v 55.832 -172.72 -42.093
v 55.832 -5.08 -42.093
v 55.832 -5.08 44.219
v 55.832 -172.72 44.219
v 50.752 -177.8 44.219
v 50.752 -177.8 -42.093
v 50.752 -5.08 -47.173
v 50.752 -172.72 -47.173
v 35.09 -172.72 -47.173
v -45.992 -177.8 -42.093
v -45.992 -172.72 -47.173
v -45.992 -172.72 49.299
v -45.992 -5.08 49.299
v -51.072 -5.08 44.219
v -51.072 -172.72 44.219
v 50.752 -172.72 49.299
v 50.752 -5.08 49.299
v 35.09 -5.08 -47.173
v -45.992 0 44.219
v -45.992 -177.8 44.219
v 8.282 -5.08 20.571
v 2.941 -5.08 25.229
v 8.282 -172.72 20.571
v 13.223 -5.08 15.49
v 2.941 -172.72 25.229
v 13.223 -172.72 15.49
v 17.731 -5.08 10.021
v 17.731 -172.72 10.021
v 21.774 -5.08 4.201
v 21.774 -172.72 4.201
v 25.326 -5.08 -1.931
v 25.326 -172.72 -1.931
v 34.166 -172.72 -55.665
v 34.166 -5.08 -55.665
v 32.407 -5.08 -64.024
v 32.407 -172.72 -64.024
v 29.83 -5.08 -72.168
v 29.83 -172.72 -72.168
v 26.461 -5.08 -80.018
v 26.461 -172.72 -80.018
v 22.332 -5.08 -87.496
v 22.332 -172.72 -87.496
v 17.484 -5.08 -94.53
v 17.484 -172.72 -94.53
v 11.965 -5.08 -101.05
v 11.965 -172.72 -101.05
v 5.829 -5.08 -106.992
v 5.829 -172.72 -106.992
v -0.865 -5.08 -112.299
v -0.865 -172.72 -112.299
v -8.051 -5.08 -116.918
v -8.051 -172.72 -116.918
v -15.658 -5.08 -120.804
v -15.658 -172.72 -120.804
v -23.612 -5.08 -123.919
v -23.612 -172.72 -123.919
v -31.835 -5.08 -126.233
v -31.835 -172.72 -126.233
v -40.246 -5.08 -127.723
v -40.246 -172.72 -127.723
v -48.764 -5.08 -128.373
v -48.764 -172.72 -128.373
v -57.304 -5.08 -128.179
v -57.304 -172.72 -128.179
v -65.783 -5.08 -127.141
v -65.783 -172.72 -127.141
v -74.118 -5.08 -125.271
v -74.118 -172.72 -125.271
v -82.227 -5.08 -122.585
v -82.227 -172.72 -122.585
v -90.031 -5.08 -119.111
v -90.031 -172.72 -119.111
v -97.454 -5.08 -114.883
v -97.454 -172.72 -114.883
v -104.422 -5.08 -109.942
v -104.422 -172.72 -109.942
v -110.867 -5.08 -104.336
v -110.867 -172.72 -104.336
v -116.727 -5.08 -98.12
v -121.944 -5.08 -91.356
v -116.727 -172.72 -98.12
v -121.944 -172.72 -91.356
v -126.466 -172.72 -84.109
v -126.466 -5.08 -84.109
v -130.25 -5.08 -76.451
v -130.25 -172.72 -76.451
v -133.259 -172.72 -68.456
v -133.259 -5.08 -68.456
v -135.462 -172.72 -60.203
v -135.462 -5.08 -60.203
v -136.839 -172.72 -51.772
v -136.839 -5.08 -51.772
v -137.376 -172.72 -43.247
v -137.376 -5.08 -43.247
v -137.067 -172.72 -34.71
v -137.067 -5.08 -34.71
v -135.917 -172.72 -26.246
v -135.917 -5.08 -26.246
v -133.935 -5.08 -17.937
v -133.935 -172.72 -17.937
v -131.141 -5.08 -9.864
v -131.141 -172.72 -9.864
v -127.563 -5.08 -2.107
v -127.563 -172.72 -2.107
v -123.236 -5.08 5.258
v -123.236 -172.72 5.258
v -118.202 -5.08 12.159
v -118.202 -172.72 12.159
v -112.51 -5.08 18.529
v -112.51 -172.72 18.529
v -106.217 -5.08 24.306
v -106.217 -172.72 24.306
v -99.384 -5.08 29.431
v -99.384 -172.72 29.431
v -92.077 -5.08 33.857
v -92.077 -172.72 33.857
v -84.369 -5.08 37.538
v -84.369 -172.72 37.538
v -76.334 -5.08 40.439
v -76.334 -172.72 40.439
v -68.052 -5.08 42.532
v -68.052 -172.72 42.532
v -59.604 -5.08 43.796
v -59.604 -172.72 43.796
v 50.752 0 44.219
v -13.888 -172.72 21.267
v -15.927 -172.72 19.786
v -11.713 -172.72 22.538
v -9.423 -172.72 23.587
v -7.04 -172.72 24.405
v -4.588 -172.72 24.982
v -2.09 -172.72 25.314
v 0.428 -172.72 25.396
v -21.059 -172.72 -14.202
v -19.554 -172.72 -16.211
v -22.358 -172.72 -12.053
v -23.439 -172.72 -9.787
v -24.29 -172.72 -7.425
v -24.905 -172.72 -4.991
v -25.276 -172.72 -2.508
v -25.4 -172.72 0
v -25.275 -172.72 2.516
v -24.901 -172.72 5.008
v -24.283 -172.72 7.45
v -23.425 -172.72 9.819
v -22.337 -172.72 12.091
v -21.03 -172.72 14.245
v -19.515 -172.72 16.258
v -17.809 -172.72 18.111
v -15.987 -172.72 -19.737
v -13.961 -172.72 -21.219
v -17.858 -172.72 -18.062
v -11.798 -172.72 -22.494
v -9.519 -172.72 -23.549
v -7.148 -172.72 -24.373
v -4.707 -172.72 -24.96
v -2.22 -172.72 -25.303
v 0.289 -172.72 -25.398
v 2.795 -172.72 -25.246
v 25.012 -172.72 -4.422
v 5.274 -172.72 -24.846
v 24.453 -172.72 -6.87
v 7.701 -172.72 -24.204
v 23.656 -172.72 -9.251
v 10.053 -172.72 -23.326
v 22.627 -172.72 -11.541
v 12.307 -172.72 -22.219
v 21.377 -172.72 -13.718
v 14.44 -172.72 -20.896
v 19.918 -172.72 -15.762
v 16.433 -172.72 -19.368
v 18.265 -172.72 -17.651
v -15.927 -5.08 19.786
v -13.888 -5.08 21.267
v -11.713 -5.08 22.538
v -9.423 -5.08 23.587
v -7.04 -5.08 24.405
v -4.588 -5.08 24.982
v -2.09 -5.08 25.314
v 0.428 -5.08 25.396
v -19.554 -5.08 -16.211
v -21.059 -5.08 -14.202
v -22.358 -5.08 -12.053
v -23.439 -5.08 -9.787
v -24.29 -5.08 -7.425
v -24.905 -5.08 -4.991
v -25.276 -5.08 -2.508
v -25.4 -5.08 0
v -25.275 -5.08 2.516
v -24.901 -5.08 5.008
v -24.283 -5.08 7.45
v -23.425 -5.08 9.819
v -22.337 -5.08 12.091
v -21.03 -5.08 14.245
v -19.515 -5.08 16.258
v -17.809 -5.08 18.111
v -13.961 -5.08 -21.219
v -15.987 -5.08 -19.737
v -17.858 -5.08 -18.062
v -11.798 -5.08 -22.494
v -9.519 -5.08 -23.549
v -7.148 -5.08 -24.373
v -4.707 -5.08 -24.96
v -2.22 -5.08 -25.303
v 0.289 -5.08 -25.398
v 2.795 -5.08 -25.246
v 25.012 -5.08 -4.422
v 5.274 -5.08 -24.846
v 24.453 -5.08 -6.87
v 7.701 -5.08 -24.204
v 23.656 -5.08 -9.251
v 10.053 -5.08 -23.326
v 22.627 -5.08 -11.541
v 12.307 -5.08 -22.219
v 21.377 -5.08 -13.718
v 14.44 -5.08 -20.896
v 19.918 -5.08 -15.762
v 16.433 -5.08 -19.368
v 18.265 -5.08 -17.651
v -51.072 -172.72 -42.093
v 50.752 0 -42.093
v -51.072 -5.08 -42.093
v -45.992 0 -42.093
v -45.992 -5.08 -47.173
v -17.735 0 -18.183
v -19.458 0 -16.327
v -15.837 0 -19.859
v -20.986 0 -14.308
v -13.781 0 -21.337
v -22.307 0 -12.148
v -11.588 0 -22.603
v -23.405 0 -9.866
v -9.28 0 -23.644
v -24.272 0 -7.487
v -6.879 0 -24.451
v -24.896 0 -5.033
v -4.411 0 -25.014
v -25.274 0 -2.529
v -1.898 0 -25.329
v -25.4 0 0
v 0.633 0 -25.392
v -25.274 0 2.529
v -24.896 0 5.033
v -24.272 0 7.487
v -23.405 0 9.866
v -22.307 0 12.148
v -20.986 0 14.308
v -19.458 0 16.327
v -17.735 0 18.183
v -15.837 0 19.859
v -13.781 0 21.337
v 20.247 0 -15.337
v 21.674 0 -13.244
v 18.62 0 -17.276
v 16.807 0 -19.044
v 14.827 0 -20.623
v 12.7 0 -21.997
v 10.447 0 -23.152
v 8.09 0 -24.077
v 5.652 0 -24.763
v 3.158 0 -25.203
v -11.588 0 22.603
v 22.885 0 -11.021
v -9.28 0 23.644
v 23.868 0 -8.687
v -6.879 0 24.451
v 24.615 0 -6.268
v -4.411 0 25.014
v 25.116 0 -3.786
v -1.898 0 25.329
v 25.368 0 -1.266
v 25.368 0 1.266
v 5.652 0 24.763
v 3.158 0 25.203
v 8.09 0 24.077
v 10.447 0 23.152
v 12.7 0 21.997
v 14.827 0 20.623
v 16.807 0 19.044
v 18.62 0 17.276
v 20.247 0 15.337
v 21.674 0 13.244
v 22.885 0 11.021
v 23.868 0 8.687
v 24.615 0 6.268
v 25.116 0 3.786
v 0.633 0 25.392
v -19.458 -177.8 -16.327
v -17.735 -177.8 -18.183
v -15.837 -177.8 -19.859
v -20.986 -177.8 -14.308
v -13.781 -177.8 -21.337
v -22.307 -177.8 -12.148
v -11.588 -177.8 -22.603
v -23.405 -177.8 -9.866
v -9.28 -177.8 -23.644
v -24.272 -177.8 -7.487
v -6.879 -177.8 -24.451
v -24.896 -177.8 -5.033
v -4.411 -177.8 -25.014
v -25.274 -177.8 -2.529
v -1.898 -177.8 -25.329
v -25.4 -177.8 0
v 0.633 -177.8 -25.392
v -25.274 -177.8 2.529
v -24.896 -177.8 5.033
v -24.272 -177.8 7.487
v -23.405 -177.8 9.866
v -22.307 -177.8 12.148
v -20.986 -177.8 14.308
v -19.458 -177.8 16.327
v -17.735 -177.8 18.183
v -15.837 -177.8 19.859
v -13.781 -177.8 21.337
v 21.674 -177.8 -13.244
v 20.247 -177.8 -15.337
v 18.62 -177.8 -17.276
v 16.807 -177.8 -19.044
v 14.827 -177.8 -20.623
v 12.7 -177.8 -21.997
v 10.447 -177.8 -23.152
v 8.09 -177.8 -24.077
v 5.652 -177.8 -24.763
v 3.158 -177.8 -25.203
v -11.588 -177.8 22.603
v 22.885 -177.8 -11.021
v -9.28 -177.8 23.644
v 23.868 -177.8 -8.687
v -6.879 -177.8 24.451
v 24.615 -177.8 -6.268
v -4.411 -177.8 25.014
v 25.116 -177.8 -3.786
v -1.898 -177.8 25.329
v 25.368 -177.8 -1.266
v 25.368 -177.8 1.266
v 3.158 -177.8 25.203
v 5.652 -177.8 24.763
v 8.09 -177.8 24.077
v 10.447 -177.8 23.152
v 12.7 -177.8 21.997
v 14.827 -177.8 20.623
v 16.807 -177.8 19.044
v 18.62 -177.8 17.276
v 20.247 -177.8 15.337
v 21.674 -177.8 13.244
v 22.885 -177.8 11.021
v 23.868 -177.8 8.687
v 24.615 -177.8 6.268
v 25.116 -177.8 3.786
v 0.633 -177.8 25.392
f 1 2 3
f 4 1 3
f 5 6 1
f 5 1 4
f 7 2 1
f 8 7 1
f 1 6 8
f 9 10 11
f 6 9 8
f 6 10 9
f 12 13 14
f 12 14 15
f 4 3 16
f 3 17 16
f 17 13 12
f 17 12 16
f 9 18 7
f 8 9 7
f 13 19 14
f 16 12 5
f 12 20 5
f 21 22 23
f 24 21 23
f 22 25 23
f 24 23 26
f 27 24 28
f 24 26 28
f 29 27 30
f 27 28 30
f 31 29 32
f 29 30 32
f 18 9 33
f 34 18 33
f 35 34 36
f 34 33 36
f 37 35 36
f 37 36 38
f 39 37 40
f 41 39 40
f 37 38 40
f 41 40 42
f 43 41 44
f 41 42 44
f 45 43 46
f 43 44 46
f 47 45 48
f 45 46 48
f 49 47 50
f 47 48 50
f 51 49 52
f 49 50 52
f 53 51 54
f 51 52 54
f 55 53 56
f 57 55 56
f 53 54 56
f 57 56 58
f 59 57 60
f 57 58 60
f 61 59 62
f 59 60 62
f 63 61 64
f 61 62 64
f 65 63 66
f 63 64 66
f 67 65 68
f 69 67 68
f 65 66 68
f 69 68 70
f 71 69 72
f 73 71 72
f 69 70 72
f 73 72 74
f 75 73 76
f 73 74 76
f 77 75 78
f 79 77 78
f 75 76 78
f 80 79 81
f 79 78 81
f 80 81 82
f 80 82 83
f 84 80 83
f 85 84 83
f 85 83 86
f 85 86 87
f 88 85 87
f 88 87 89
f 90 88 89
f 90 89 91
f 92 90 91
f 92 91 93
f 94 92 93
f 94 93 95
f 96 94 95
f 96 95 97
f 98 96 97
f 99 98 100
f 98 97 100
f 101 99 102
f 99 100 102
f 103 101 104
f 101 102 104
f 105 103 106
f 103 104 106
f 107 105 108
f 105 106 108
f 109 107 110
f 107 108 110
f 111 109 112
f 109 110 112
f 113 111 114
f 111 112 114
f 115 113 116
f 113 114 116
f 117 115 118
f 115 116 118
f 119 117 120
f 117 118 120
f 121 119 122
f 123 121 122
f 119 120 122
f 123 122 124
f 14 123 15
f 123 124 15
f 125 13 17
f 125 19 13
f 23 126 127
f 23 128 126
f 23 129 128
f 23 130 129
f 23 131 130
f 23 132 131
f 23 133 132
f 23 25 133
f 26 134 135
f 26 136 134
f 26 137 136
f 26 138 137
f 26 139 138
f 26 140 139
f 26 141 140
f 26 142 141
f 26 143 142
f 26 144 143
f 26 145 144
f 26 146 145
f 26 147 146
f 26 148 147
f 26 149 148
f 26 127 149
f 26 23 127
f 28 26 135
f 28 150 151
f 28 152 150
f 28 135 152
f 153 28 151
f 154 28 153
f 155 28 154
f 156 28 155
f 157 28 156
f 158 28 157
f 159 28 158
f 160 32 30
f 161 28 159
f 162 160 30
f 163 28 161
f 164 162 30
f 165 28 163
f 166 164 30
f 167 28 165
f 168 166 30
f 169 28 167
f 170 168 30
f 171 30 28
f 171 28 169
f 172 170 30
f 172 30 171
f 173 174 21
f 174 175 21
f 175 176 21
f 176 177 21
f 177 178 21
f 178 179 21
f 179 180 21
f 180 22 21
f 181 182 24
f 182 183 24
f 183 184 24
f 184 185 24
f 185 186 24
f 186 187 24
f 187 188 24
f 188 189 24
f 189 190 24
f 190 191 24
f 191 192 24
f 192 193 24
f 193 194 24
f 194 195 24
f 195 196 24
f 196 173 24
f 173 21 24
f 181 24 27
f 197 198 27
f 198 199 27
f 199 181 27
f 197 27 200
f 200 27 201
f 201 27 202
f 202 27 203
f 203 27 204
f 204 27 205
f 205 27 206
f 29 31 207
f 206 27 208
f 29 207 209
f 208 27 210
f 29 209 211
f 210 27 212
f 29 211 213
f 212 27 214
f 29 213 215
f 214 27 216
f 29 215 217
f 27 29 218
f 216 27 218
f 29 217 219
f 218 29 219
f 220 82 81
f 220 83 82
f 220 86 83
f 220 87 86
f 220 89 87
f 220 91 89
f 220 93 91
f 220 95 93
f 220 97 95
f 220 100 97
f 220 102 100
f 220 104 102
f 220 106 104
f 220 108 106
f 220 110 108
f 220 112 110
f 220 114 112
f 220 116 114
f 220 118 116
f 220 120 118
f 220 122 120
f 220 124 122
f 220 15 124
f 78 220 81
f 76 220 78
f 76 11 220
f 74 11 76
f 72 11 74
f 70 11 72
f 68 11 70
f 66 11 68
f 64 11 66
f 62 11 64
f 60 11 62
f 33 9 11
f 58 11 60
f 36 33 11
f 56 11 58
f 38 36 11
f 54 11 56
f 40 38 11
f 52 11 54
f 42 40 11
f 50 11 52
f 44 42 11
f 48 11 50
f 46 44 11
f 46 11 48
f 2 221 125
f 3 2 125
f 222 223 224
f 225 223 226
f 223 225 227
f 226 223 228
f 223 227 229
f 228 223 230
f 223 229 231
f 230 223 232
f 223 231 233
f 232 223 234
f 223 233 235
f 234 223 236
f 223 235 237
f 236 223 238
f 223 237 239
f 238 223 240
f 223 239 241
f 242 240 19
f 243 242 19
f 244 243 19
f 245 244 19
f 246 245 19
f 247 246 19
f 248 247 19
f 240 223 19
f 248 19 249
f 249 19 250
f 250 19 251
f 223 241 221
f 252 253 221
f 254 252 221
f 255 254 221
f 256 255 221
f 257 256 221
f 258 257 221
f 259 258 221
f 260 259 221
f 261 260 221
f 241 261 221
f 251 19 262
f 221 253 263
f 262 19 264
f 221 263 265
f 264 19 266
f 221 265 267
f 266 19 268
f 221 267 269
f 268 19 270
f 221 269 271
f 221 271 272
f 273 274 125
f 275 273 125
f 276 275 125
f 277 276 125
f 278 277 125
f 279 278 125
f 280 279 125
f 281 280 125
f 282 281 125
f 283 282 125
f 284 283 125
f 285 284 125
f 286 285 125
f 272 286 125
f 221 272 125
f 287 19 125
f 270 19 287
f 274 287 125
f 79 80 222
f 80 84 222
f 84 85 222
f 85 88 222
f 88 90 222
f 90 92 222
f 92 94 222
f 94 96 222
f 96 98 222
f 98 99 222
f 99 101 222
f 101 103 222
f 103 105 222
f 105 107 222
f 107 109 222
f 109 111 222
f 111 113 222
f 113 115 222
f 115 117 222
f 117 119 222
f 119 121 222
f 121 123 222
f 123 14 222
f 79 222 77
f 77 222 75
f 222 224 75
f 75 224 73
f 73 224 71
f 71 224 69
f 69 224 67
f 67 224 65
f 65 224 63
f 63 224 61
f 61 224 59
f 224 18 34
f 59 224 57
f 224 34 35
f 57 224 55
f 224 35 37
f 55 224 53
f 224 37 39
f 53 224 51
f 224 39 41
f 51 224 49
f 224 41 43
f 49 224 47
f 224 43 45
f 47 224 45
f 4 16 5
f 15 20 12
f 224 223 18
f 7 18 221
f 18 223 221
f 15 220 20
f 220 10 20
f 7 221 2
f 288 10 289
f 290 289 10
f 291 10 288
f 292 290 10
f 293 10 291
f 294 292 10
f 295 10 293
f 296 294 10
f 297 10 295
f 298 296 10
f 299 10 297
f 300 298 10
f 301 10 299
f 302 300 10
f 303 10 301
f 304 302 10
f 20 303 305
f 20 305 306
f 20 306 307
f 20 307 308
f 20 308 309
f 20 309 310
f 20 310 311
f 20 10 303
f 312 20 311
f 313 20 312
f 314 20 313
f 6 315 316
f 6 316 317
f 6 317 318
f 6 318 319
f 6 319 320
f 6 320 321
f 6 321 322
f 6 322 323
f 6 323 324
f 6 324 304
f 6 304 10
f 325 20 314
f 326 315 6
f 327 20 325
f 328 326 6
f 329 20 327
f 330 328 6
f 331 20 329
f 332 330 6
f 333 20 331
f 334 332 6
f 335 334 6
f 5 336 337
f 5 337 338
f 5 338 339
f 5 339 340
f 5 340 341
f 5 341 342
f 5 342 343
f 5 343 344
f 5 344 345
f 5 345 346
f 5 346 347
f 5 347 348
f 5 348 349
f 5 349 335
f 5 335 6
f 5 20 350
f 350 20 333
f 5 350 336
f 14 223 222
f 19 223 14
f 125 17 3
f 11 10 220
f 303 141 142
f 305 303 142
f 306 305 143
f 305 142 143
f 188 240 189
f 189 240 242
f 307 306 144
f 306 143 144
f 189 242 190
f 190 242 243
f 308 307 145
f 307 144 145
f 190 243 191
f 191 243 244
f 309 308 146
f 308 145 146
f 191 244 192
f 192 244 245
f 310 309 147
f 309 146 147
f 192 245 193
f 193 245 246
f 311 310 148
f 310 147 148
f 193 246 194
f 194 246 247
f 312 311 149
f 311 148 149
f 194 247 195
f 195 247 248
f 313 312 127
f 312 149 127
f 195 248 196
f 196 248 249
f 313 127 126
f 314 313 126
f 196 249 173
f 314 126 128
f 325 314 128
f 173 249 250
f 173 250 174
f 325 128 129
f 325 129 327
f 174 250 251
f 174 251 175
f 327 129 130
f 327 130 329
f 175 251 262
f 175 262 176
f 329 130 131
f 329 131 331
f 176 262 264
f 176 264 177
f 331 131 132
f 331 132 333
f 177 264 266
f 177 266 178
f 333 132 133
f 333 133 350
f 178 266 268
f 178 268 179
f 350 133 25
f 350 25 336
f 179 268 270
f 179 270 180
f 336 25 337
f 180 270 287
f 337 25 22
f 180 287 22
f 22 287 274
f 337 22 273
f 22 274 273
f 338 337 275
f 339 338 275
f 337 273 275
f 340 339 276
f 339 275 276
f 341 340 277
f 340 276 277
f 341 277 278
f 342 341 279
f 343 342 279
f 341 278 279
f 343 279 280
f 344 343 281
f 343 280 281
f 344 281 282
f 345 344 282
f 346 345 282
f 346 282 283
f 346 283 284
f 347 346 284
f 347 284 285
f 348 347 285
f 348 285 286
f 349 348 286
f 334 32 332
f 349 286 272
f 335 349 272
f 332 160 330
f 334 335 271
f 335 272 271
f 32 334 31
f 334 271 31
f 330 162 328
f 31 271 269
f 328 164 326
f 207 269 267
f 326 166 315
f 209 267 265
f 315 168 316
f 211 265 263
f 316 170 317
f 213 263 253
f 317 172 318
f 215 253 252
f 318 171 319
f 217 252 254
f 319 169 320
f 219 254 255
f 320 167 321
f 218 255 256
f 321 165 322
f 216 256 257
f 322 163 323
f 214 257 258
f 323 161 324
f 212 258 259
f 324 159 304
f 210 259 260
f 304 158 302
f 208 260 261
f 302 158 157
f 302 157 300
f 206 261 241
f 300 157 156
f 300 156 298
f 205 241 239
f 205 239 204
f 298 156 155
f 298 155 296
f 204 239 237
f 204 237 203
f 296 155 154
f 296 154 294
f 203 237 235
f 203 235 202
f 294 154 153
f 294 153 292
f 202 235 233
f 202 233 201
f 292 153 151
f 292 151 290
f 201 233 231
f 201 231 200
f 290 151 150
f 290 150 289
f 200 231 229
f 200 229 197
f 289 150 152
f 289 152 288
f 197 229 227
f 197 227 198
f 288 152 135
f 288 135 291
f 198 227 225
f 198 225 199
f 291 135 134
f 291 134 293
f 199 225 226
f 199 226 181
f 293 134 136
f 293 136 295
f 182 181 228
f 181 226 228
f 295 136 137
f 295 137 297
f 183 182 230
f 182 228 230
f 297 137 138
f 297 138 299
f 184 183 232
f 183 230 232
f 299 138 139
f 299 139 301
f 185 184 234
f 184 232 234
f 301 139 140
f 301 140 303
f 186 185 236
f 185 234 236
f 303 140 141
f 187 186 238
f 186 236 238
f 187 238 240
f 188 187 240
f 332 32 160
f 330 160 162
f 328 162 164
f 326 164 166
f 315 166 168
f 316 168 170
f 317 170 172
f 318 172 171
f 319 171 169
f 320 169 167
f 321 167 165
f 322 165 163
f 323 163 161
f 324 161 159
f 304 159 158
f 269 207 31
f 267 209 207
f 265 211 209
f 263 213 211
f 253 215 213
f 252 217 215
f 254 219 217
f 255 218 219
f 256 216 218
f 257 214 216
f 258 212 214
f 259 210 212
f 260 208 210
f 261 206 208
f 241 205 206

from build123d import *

# Parameters (mm, degrees)
F3_W       = 106.9038137794
F3_H       = 96.4715331793
F4_DEPTH   = 177.8
F5_SIZE    = 5.08
F1_D       = 50.8
F4_FACE1_W = 167.64
F4_FACE1_H = 86.3115331793


with BuildPart() as f4:
    # F3 (on Front) → F4 (new body)
    with BuildSketch(Plane.XZ):
        with Locations((2.3797191679, 1.0631904006)):
            Rectangle(F3_W, F3_H)
    extrude(amount=F4_DEPTH)

    # F5
    f5_edges = [f4.edges().sort_by_distance(p)[0] for p in [
        (55.831626, -88.9, 49.298957),
        (2.379719, -177.8, 49.298957),
        (-51.072188, -177.8, 1.06319),
        (2.379719, -177.8, -47.172576),
        (55.831626, -177.8, 1.06319),
        (2.379719, 0, 49.298957),
        (-51.072188, 0, 1.06319),
        (2.379719, 0, -47.172576),
        (55.831626, 0, 1.06319),
        (-51.072188, -88.9, -47.172576),
        (-51.072188, -88.9, 49.298957),
        (55.831626, -88.9, -47.172576),
    ]]
    chamfer(f5_edges, length=F5_SIZE)

    # F1 (through all)
    with Locations(Plane.XZ.offset(177.8)):
        with Locations((0, 0)):
            Hole(F1_D / 2)

    # F4_face1 (on face) → F2 (revolve)
    with BuildSketch(Plane(origin=(-51.0721877217, -88.9, 1.0631904006), x_dir=(0, -1, 0), z_dir=(-1, 0, 0))):
        Rectangle(F4_FACE1_W, F4_FACE1_H)
    revolve(axis=Axis((-51.0721877217, -88.9, -42.092576189), (0, 1, 0)))


solid = f4.part
